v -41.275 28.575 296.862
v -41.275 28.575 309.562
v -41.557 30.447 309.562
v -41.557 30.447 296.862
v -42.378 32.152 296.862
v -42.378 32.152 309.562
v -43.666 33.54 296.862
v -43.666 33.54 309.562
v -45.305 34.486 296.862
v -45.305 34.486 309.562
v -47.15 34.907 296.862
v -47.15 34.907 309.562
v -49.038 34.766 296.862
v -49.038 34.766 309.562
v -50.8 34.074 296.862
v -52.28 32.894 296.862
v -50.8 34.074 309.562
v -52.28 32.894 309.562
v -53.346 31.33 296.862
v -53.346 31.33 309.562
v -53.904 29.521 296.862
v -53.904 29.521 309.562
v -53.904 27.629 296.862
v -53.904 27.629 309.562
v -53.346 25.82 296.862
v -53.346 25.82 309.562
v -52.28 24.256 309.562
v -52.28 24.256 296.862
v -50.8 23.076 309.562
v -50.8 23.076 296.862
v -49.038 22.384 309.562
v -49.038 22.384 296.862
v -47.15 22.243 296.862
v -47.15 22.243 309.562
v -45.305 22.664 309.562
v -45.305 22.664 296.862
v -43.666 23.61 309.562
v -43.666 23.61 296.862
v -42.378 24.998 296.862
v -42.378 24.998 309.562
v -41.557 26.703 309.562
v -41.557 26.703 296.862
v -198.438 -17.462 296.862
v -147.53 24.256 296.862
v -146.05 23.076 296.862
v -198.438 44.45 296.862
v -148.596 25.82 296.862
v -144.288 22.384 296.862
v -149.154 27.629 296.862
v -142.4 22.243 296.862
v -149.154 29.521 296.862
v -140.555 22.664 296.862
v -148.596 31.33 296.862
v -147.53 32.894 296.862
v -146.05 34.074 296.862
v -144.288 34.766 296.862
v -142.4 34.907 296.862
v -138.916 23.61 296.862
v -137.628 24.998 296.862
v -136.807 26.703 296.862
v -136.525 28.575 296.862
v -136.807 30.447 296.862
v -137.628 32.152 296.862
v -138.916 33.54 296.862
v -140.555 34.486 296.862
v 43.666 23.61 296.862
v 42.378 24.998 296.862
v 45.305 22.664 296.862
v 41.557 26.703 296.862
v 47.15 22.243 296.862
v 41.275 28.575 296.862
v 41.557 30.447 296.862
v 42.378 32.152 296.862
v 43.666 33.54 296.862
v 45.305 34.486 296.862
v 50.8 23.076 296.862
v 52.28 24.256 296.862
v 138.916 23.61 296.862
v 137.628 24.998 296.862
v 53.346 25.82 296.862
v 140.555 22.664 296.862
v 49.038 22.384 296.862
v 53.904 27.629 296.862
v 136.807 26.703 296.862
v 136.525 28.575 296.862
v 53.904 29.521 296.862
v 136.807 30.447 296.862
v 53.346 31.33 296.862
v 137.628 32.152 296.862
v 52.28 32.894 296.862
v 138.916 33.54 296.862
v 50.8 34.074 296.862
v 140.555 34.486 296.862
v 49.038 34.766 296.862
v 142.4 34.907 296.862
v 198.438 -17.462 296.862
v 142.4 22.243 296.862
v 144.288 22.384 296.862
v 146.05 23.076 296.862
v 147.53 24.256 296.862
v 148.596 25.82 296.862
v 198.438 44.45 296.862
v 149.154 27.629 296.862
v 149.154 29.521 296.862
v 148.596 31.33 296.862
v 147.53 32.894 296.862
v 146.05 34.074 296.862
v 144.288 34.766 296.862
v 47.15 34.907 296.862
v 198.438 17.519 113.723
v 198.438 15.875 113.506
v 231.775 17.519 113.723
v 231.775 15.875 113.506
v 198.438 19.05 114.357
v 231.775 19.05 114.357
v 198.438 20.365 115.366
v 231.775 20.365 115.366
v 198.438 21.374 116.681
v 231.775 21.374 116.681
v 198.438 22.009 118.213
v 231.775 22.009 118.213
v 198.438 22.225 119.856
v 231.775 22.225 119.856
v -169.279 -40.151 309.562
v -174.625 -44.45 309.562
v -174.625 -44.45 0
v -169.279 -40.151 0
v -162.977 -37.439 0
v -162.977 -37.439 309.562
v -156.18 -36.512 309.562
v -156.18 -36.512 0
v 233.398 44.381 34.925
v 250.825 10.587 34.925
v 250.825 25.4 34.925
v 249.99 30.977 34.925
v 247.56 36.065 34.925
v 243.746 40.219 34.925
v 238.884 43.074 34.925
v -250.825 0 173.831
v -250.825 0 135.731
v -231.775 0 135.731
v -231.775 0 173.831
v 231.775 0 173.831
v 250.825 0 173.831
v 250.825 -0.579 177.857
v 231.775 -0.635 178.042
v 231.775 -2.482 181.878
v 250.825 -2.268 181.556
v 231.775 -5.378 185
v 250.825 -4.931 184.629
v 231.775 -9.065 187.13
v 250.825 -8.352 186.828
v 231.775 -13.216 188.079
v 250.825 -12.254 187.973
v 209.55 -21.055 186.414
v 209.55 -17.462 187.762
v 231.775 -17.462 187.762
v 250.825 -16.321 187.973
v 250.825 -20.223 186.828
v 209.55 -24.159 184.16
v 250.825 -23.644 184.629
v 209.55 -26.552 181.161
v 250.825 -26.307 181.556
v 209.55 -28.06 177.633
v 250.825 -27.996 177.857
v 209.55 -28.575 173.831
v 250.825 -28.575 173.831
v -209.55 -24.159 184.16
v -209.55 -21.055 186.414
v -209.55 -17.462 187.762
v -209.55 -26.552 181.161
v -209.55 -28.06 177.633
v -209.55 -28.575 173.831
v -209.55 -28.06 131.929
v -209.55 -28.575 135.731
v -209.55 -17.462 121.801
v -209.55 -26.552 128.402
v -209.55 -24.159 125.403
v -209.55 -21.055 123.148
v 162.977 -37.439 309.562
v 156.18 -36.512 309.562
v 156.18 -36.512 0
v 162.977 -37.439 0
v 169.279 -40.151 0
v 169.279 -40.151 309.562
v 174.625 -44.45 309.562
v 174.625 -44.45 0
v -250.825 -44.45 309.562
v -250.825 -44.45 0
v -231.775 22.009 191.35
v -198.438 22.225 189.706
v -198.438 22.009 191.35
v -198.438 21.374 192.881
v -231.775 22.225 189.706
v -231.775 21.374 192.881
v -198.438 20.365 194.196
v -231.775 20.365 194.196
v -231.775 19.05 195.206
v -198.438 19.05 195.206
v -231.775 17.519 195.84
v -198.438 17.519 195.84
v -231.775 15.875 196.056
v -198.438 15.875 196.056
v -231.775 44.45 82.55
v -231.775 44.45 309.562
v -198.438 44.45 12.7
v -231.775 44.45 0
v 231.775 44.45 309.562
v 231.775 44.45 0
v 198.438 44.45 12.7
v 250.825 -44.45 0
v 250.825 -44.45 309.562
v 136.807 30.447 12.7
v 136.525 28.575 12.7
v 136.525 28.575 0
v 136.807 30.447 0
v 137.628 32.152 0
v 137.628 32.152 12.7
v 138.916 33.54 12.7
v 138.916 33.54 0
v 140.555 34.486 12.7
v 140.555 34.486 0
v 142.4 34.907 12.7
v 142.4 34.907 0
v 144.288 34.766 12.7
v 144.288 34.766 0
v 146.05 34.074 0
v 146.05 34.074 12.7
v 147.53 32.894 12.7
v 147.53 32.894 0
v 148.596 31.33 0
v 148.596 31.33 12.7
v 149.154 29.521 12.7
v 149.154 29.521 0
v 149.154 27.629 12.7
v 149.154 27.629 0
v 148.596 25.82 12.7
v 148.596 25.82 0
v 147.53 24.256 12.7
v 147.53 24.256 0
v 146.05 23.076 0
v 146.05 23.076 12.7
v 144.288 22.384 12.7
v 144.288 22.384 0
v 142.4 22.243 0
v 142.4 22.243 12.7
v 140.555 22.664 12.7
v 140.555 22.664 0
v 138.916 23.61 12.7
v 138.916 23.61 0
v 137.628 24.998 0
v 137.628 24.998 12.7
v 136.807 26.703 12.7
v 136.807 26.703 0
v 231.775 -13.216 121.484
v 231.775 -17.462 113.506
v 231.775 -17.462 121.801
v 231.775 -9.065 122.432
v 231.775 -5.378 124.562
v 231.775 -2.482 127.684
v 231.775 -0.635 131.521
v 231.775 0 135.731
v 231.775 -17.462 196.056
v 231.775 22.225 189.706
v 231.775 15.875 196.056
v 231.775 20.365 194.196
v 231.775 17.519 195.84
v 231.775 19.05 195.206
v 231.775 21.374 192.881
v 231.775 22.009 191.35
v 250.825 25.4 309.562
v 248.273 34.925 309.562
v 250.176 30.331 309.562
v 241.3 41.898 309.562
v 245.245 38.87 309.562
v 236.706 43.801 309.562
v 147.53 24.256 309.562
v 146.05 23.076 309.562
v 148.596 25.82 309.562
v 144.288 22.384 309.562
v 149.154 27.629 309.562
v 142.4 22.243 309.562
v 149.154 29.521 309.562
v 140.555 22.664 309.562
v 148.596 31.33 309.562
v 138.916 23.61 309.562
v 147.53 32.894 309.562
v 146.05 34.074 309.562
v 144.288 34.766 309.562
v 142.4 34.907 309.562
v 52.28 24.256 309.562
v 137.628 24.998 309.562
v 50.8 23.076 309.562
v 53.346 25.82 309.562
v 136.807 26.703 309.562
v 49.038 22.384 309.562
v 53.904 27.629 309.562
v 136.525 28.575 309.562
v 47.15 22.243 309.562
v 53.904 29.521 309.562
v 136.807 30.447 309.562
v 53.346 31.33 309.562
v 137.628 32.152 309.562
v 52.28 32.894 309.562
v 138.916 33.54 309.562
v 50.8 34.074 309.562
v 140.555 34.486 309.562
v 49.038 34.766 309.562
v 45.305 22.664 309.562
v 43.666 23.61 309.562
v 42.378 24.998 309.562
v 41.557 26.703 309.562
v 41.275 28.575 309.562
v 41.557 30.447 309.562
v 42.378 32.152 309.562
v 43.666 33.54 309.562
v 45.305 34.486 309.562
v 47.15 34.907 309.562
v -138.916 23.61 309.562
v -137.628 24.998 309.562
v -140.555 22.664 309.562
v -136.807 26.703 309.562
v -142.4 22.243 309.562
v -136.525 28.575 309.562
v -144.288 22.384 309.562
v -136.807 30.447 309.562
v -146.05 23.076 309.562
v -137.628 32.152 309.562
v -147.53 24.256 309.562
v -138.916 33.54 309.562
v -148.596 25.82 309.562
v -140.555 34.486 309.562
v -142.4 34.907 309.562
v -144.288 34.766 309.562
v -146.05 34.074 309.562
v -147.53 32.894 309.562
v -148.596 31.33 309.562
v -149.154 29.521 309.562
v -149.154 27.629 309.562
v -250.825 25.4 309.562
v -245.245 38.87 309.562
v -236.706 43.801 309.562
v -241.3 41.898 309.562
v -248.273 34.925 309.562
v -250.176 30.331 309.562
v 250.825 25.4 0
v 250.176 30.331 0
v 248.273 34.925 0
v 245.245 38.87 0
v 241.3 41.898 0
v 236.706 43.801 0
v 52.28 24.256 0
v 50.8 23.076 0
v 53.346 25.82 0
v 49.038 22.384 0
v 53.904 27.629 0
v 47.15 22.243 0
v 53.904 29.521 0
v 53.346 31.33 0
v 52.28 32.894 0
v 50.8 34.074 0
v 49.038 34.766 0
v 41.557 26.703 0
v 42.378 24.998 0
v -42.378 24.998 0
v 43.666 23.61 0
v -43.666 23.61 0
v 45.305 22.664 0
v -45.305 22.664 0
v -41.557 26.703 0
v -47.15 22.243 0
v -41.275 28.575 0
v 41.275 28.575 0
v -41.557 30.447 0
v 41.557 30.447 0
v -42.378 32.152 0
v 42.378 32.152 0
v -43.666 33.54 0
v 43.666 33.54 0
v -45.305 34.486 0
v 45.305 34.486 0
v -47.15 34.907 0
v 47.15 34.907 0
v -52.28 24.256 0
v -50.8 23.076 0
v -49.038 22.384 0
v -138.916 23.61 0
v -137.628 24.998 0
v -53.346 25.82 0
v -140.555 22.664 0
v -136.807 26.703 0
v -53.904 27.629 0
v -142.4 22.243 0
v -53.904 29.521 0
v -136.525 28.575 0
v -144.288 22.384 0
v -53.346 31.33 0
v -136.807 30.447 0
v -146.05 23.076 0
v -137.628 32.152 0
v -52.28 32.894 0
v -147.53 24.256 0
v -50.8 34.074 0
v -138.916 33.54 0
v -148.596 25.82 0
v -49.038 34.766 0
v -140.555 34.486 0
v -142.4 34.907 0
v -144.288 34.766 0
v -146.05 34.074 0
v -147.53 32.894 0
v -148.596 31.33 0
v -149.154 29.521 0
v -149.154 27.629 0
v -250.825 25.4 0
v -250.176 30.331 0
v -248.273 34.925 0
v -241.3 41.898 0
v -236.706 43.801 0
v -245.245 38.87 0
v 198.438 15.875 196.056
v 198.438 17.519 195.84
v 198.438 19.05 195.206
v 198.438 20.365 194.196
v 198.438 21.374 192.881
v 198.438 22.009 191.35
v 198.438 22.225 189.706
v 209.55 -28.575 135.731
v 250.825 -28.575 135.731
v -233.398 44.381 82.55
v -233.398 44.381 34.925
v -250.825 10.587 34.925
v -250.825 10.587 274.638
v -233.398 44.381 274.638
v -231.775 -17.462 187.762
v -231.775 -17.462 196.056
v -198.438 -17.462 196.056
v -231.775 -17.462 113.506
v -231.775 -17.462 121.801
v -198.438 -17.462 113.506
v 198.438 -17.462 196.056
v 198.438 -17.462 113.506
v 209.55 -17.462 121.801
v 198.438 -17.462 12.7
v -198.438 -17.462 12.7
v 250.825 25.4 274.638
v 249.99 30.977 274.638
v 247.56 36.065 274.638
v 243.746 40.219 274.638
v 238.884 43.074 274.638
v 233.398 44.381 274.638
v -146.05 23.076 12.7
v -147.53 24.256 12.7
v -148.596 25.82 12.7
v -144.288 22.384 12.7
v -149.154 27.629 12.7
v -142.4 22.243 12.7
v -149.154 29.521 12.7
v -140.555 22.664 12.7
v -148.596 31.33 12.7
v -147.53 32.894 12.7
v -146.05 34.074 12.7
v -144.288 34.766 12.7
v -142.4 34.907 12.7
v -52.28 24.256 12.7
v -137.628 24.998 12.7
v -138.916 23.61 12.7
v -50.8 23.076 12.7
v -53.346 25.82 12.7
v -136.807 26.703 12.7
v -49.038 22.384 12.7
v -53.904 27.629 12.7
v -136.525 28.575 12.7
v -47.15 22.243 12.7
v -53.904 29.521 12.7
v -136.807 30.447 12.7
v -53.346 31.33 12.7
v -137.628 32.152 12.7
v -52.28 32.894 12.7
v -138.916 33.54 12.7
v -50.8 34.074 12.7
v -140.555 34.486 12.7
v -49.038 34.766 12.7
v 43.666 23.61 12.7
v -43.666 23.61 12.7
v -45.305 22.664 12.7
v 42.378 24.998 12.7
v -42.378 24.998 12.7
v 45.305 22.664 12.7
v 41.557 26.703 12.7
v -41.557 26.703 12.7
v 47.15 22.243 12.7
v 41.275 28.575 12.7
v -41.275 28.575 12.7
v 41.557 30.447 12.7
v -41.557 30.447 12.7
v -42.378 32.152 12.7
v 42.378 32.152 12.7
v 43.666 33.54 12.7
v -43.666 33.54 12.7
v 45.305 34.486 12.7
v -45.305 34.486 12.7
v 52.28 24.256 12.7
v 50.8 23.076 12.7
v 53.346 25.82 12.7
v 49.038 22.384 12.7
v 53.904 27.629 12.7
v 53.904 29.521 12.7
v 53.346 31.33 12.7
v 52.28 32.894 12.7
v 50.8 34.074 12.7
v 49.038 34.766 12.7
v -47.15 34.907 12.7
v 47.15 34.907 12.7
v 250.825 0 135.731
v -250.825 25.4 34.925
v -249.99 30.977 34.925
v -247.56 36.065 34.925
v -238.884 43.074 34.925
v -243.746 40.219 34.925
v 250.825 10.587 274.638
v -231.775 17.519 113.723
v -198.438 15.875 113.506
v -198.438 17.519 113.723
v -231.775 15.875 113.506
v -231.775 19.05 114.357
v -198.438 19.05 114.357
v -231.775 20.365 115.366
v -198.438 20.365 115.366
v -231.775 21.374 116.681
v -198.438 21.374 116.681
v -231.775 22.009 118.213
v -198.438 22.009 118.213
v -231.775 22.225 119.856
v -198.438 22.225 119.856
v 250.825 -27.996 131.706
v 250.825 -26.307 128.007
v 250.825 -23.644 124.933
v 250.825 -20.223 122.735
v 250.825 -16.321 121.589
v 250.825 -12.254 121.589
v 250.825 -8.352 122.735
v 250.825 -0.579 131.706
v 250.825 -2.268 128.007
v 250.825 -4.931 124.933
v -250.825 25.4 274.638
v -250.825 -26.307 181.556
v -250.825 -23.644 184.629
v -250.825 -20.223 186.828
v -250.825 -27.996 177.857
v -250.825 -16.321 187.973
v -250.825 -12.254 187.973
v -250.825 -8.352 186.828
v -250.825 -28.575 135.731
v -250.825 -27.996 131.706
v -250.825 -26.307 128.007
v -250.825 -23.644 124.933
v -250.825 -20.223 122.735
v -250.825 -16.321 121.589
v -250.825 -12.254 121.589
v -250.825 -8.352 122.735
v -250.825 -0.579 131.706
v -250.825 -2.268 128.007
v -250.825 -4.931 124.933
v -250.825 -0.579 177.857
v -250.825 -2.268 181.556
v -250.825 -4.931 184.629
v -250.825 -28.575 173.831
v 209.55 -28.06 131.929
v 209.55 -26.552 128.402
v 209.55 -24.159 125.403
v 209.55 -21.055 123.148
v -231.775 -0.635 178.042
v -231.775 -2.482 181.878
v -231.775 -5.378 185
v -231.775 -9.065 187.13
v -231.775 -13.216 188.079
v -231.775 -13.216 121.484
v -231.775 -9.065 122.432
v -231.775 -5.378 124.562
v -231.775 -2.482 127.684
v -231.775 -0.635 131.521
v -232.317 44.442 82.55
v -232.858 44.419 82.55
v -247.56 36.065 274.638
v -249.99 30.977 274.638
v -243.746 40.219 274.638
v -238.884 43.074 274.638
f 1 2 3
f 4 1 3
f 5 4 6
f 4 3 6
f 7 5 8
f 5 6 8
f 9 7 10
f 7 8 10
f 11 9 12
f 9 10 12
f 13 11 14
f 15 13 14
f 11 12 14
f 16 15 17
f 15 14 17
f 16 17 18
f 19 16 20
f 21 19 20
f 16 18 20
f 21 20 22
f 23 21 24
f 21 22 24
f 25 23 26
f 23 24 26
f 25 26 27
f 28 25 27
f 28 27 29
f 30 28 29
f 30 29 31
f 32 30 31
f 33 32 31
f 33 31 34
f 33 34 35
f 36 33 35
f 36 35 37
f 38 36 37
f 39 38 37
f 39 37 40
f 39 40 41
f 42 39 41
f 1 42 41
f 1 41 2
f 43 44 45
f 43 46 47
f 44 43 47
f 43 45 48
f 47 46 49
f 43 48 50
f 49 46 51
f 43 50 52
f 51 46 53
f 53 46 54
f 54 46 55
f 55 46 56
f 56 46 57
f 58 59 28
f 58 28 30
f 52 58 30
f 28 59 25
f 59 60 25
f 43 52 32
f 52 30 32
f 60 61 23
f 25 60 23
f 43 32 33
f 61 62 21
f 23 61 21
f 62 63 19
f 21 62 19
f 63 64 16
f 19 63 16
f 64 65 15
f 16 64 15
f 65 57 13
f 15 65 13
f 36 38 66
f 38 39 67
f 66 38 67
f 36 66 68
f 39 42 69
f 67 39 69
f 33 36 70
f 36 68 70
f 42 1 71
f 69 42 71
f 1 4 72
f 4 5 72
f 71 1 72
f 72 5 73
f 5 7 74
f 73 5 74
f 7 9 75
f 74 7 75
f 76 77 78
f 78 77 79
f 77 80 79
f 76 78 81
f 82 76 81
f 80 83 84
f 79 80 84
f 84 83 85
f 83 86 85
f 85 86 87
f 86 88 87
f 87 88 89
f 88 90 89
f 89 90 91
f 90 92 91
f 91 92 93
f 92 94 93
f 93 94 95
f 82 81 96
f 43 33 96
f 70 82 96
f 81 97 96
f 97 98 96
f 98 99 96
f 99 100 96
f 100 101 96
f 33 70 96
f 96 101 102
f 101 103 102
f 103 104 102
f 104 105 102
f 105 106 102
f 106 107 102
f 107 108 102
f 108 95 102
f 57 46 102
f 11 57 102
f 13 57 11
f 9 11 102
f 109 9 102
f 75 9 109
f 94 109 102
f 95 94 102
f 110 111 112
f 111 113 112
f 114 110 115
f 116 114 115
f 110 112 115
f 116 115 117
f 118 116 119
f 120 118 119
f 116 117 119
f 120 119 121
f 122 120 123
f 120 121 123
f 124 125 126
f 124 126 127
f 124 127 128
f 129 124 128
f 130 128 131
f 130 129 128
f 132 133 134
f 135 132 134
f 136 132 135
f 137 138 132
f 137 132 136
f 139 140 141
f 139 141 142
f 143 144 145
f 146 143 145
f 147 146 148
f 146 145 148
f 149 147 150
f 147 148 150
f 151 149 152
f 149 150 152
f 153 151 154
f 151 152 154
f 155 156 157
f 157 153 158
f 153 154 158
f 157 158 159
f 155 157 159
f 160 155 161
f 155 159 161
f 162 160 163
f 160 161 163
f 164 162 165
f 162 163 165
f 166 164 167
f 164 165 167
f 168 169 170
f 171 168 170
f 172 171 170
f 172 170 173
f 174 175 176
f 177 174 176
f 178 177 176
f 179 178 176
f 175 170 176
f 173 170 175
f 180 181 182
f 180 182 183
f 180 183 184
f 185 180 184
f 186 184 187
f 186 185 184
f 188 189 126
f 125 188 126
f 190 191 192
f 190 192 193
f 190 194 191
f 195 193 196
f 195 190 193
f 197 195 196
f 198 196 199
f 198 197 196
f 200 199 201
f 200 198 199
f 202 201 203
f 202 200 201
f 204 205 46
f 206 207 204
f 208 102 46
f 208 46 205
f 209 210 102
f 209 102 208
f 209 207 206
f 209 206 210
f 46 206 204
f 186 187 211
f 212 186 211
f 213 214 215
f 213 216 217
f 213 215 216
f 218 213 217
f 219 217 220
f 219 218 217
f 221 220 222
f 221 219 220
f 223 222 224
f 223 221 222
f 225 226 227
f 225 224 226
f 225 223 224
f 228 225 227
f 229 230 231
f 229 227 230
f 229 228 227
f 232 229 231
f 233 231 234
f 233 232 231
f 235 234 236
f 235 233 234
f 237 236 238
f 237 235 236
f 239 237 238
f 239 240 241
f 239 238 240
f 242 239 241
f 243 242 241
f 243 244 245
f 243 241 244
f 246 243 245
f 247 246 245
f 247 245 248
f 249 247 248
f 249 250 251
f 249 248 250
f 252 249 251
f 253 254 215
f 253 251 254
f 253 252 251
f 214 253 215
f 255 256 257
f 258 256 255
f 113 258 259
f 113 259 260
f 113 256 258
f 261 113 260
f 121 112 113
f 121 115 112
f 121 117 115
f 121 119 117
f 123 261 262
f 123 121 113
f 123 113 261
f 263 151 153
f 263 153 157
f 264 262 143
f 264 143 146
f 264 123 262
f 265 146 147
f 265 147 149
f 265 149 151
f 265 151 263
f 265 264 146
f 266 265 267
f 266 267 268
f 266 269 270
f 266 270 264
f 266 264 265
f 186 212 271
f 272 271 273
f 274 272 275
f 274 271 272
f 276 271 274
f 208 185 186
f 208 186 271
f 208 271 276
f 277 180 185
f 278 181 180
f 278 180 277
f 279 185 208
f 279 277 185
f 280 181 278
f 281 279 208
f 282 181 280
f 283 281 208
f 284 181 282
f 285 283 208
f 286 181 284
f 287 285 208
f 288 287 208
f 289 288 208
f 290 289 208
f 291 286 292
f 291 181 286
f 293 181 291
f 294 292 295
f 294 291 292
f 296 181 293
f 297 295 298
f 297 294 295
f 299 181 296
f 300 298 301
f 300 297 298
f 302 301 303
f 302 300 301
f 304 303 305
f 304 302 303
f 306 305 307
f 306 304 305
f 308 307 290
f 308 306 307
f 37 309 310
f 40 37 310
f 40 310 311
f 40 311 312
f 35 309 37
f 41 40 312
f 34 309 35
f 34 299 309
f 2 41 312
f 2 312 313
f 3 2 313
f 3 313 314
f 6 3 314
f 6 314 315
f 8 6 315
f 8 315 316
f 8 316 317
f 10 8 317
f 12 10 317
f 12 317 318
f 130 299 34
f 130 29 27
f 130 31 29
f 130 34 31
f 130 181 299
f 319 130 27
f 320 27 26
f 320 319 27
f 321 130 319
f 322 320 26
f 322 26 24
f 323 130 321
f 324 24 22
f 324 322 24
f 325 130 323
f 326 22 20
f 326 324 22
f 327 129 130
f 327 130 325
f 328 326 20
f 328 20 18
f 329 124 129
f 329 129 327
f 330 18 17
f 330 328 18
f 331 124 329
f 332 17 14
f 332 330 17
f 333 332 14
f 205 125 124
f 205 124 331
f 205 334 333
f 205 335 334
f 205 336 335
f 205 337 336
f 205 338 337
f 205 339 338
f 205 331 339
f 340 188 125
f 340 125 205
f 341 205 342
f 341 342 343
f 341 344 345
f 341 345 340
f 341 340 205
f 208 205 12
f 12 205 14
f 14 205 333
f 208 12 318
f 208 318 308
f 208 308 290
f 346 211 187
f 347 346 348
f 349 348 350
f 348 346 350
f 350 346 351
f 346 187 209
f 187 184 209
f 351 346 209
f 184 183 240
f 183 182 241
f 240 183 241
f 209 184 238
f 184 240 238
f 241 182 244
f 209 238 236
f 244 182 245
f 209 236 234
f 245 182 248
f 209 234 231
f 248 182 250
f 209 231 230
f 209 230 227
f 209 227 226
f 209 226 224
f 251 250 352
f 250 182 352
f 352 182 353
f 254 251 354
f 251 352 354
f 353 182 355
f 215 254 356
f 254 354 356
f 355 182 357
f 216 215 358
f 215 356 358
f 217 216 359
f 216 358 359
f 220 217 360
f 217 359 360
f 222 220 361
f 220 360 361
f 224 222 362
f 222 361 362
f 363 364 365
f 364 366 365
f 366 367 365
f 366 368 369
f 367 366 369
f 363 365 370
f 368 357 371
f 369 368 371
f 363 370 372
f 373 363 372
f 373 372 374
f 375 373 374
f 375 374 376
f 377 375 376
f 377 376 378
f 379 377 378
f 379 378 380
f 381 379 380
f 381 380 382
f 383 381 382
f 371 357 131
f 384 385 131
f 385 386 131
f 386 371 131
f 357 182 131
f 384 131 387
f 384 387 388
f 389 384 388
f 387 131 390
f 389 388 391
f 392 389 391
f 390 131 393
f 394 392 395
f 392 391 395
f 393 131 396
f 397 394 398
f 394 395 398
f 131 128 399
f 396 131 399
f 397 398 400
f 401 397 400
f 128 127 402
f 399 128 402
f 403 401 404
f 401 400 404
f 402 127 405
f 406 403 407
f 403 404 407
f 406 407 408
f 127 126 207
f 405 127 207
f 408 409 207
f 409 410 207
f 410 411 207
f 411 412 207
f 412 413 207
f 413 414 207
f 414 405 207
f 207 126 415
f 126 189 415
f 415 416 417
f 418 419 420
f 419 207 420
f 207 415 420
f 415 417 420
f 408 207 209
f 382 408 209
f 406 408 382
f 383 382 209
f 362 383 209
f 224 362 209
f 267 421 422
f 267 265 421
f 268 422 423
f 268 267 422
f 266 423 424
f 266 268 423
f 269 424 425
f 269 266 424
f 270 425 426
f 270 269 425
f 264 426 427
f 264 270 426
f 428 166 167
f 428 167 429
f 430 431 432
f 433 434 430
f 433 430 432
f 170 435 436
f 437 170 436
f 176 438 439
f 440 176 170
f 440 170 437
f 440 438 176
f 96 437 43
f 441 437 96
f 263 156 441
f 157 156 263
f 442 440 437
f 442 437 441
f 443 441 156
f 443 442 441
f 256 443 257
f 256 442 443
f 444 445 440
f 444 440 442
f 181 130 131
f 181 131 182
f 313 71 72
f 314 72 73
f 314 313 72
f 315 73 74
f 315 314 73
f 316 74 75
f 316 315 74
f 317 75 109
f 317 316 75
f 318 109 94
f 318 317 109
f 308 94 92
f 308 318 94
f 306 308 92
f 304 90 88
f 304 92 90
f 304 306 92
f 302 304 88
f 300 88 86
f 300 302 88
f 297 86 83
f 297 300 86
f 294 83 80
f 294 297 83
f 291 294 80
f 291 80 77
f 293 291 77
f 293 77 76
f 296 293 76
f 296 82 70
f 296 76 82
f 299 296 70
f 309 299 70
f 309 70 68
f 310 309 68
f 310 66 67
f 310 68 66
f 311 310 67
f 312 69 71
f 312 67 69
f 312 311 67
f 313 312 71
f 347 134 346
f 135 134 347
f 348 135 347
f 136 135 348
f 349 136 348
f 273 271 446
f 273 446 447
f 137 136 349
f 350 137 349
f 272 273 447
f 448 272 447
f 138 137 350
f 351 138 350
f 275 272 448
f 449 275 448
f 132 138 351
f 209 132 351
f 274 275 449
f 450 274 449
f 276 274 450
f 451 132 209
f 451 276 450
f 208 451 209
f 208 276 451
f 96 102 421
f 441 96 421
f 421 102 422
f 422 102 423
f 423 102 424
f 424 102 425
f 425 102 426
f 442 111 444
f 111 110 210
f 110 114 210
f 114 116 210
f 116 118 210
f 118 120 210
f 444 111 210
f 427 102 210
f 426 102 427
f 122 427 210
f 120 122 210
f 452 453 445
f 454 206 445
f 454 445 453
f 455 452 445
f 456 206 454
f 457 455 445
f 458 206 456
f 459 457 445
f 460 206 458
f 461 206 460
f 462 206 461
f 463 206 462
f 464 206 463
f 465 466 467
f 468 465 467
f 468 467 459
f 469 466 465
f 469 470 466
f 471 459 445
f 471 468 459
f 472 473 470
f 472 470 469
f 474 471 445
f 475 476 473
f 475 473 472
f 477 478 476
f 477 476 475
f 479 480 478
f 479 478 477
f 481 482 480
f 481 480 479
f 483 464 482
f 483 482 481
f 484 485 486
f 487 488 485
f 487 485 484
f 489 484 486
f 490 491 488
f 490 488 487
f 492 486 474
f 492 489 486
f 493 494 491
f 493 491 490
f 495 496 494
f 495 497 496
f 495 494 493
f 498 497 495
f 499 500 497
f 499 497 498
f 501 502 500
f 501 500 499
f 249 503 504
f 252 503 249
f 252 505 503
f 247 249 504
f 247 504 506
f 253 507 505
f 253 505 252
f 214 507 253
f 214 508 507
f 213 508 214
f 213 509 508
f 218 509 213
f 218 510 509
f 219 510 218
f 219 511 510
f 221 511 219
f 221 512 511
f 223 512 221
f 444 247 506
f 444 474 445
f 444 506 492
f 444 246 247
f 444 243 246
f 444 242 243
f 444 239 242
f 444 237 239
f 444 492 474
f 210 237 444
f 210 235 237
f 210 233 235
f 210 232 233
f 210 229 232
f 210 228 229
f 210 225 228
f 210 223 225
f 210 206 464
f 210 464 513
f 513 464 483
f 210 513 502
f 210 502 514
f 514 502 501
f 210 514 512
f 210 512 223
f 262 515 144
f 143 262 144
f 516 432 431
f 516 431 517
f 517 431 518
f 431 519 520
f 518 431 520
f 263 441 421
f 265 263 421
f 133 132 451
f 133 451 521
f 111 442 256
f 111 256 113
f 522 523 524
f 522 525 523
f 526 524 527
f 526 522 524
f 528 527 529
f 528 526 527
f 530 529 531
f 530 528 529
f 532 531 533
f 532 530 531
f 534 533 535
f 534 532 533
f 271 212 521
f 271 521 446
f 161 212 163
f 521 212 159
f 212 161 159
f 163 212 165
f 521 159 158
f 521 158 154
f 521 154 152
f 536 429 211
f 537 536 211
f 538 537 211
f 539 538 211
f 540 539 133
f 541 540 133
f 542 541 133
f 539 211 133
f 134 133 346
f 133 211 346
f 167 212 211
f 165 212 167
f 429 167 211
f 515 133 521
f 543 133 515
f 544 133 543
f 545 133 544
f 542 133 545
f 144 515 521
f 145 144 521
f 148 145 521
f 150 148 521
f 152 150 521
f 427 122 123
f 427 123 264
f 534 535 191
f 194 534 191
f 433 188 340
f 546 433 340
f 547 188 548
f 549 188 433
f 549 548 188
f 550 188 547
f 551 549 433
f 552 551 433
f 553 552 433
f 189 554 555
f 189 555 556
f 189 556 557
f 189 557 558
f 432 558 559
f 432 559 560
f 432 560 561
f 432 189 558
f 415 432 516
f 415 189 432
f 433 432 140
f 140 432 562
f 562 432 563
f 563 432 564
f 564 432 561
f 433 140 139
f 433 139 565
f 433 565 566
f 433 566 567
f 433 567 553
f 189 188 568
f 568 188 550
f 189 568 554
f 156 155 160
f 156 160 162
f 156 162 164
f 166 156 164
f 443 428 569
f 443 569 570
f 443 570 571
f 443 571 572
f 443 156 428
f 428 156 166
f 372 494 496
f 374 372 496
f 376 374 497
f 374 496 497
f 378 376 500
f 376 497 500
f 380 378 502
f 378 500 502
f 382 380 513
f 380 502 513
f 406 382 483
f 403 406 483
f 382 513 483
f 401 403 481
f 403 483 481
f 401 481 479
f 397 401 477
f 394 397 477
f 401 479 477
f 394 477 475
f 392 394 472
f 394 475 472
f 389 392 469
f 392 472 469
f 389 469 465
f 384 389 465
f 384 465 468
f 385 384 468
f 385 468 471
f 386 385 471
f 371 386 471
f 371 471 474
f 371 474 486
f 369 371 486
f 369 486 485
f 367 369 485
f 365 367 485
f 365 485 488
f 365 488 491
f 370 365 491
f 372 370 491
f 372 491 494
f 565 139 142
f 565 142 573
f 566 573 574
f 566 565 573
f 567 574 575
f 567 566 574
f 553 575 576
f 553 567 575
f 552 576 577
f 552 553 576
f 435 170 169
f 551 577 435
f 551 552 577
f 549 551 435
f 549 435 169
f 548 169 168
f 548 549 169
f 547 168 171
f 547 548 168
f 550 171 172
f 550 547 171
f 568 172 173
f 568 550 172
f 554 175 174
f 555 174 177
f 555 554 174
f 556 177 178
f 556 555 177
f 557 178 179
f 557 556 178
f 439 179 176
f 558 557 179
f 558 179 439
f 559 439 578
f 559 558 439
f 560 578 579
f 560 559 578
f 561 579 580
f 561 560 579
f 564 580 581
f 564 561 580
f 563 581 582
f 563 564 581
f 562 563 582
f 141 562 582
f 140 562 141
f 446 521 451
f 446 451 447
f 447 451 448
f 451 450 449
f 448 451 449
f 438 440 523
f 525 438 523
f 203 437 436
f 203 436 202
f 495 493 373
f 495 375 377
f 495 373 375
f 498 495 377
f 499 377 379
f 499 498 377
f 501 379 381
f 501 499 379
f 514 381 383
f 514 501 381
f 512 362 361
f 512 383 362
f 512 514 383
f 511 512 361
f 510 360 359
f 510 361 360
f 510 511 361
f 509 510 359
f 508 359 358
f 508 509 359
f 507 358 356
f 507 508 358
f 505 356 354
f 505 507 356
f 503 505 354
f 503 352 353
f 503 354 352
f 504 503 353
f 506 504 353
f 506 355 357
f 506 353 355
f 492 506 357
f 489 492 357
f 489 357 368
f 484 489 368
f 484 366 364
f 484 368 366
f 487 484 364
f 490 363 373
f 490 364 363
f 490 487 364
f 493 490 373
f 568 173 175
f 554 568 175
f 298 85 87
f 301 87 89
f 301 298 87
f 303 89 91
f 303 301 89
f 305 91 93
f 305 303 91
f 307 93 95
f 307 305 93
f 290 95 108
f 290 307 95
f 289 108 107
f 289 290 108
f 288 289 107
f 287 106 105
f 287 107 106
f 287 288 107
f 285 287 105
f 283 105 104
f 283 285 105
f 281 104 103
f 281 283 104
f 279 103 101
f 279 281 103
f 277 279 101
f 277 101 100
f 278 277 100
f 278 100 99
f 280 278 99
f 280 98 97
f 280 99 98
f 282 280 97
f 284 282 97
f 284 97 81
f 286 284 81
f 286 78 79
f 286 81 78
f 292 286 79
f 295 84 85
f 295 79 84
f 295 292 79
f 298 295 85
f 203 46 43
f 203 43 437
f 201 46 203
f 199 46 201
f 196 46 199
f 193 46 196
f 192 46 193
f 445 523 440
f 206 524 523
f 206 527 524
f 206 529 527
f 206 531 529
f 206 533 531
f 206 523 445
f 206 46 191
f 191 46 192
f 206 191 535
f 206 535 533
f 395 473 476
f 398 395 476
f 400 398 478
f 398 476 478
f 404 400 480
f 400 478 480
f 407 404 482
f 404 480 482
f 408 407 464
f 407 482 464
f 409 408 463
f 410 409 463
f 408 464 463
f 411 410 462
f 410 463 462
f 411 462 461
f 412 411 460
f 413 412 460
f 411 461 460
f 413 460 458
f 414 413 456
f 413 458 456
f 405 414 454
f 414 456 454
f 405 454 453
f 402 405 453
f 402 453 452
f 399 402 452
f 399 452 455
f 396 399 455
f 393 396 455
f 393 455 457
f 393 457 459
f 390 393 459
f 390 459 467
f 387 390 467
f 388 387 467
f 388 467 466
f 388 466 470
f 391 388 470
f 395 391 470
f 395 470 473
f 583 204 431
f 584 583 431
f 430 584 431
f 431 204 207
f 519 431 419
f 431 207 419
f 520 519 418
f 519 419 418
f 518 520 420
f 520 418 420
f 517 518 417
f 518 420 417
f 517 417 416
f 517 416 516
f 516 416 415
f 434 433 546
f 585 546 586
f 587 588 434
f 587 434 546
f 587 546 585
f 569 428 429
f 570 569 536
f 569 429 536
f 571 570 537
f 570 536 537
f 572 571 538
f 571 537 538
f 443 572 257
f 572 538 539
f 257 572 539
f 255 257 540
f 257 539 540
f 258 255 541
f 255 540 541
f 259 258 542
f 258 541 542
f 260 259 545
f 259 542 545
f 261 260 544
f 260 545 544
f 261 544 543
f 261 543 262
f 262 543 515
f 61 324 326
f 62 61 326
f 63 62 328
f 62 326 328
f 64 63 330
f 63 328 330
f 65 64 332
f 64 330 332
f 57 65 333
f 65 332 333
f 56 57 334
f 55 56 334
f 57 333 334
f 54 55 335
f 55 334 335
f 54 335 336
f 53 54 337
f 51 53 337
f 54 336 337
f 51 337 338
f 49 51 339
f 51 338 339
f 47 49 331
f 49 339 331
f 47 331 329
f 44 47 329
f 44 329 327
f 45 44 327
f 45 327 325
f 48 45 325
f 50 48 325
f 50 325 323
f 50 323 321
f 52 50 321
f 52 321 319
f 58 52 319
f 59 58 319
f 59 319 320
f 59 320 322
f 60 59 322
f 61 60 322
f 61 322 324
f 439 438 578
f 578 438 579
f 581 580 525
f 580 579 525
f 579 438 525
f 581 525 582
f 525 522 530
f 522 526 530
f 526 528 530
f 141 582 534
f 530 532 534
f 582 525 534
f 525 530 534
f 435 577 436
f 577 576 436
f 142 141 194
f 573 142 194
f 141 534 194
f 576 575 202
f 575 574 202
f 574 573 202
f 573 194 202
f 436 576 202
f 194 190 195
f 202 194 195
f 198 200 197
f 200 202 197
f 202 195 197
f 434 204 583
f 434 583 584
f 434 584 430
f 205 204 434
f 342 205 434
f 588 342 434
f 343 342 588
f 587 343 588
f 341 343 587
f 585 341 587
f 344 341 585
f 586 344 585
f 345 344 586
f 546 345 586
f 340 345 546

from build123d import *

# Parameters (mm, degrees)
SKETCH1_W            = 501.65
SKETCH1_H            = 88.9
BOSS_EXTRUDE1_DEPTH  = 309.5625
SKETCH2_W            = 349.25
SKETCH2_H            = 7.9375
CUT_EXTRUDE1_DEPTH   = 401.896401245
FILLET1_R            = 25.4
CUT_EXTRUDE2_DEPTH   = 119.85625
FILLET2_R            = 19.05
CUT_EXTRUDE4_DEPTH   = 41.275
SKETCH4_W            = 396.875
SKETCH4_H            = 284.1625
CUT_EXTRUDE3_DEPTH   = 61.9125
SKETCH6_W            = 82.55
SKETCH6_H            = 39.6875
CUT_EXTRUDE5_DEPTH   = 33.3375
FILLET3_R            = 6.35
SKETCH7_R            = 6.35
CUT_EXTRUDE6_DEPTH   = 401.896401245
FILLET3_OF_MIRROR5_R = 6.35


# Some blends are built 0.0001 mm under size
with BuildPart() as part:
    # Sketch1 → Boss-Extrude1 (new body)
    with BuildSketch(Plane.XY):
        Rectangle(SKETCH1_W, SKETCH1_H)
    extrude(amount=BOSS_EXTRUDE1_DEPTH)

    # Sketch2 → Cut-Extrude1 (cut, through all)
    with BuildSketch(Plane.XY.offset(309.5625)):
        with Locations((0, -40.48125)):
            Rectangle(SKETCH2_W, SKETCH2_H)
    extrude(amount=-CUT_EXTRUDE1_DEPTH, mode=Mode.SUBTRACT)

    # Fillet1
    # the kernel refuses this fillet: 25.4 mm, written as the material it adds along each edge
    with BuildSketch(Plane(origin=(174.625, -36.5125, 309.5625), x_dir=(0, -1, 0), z_dir=(0, 0, -1))) as fillet1_piece_1:
        with BuildLine():
            CenterArc((25.4, 18.445083186), FILLET1_R, 180, 46.567463442)
            Line((0, 18.445083186), (-0.508, 18.445083186))
            Line((-0.508, 18.445083186), (-0.508, 0))
            Line((-0.508, 0), (0, -0.508))
            ThreePointArc((0, -0.508), (3.96875, -0.508), (7.58825, -0.368901664))
            Line((7.58825, -0.368901664), (7.9375, 0))
        make_face()
    extrude(amount=309.5625)
    with BuildSketch(Plane(origin=(-174.625, -36.5125, 309.5625), x_dir=(0, -1, 0), z_dir=(0, 0, -1))) as fillet1_piece_2:
        with BuildLine():
            CenterArc((25.4, -18.445083186), FILLET1_R, 133.432536558, 46.567463442)
            Line((0, -18.445083186), (-0.508, -18.445083186))
            Line((-0.508, -18.445083186), (-0.508, 0))
            Line((-0.508, 0), (0, 0.508))
            ThreePointArc((0, 0.508), (3.96875, 0.508), (7.58825, 0.368901664))
            Line((7.58825, 0.368901664), (7.9375, 0))
        make_face()
    extrude(amount=309.5625)

    # Sketch3 → Cut-Extrude2 (cut, symmetric)
    with BuildSketch(Plane.XY.offset(154.78125)):
        Polygon((-250.825, 44.45), (-233.3625, 44.45), (-250.825, 10.5874677), align=None)
    cut_extrude2 = extrude(amount=CUT_EXTRUDE2_DEPTH, both=True, mode=Mode.SUBTRACT)

    # Fillet2
    fillet2_edges = [part.edges().sort_by_distance(p)[0] for p in [
        (250.825, 44.45, 154.78125),
    ]]
    fillet(fillet2_edges, radius=FILLET2_R)
    # the kernel refuses this fillet: 19.05 mm, written as the material it takes off along each edge
    with BuildSketch(Plane(origin=(-250.825, 44.45, -47.625), x_dir=(1, 0, 0), z_dir=(0, 0, 1))) as fillet2_2_piece_1:
        with BuildLine():
            CenterArc((FILLET2_R, -FILLET2_R), FILLET2_R, 90, 90)
            Line((0, -FILLET2_R), (-FILLET2_R * 0.02, -FILLET2_R))
            Line((-FILLET2_R * 0.02, -FILLET2_R), (-FILLET2_R * 0.02, FILLET2_R * 0.02))
            Line((-FILLET2_R * 0.02, FILLET2_R * 0.02), (FILLET2_R, FILLET2_R * 0.02))
            Line((FILLET2_R, FILLET2_R * 0.02), (FILLET2_R, 0))
        make_face()
    extrude(amount=130.175, mode=Mode.SUBTRACT)
    fillet2_3_edges = [part.edges().sort_by_distance(p)[0] for p in [
        (-250.825, 44.45, 292.1),
    ]]
    fillet(fillet2_3_edges, radius=FILLET2_R - 0.0001)  # a hair under: the kernel refuses the full size

    # Sketch5 → Cut-Extrude4 (cut)
    with BuildSketch(Plane.ZY.offset(250.825)):
        with BuildLine():
            Line((135.73125, 0), (173.83125, 0))
            ThreePointArc((173.83125, 0), (188.11875, -14.2875), (173.83125, -28.575))
            Line((173.83125, -28.575), (135.73125, -28.575))
            ThreePointArc((135.73125, -28.575), (121.44375, -14.2875), (135.73125, 0))
        make_face()
    cut_extrude4 = extrude(amount=-CUT_EXTRUDE4_DEPTH, mode=Mode.SUBTRACT)

    # Mirror4: Cut-Extrude2, Cut-Extrude4 across plane
    add(cut_extrude2.mirror(Plane.ZY), mode=Mode.SUBTRACT)
    add(cut_extrude4.mirror(Plane.ZY), mode=Mode.SUBTRACT)

    # Sketch4 → Cut-Extrude3 (cut)
    with BuildSketch(Plane(origin=(0, 44.45, 0), x_dir=(1, 0, 0), z_dir=(0, 1, 0))):
        with Locations((0, -154.78125)):
            Rectangle(SKETCH4_W, SKETCH4_H)
    extrude(amount=-CUT_EXTRUDE3_DEPTH, mode=Mode.SUBTRACT)

    # Sketch6 → Cut-Extrude5 (cut)
    with BuildSketch(Plane.ZY.offset(198.4375)):
        with Locations((154.78125, 2.38125)):
            Rectangle(SKETCH6_W, SKETCH6_H)
    cut_extrude5 = extrude(amount=CUT_EXTRUDE5_DEPTH, mode=Mode.SUBTRACT)

    # Fillet3
    fillet3_edges = [part.edges().sort_by_distance(p)[0] for p in [
        (-215.10625, 22.225, 196.05625),
        (-215.10625, 22.225, 113.50625),
    ]]
    fillet(fillet3_edges, radius=FILLET3_R)

    # Sketch7 → Cut-Extrude6 (cut, through all)
    with BuildSketch(Plane.XY.offset(309.5625)):
        with Locations((-47.625, 28.575)):
            Circle(SKETCH7_R)
        with Locations((-142.875, 28.575)):
            Circle(SKETCH7_R)
    cut_extrude6 = extrude(amount=-CUT_EXTRUDE6_DEPTH, mode=Mode.SUBTRACT)

    # Mirror5: Cut-Extrude5, Cut-Extrude6 across plane
    add(cut_extrude5.mirror(Plane.ZY), mode=Mode.SUBTRACT)
    add(cut_extrude6.mirror(Plane.ZY), mode=Mode.SUBTRACT)

    # Fillet3 of Mirror5
    fillet3_of_mirror5_edges = [part.edges().sort_by_distance(p)[0] for p in [
        (215.10625, 22.225, 196.05625),
        (215.10625, 22.225, 113.50625),
    ]]
    fillet(fillet3_of_mirror5_edges, radius=FILLET3_OF_MIRROR5_R)


solid = part.part
